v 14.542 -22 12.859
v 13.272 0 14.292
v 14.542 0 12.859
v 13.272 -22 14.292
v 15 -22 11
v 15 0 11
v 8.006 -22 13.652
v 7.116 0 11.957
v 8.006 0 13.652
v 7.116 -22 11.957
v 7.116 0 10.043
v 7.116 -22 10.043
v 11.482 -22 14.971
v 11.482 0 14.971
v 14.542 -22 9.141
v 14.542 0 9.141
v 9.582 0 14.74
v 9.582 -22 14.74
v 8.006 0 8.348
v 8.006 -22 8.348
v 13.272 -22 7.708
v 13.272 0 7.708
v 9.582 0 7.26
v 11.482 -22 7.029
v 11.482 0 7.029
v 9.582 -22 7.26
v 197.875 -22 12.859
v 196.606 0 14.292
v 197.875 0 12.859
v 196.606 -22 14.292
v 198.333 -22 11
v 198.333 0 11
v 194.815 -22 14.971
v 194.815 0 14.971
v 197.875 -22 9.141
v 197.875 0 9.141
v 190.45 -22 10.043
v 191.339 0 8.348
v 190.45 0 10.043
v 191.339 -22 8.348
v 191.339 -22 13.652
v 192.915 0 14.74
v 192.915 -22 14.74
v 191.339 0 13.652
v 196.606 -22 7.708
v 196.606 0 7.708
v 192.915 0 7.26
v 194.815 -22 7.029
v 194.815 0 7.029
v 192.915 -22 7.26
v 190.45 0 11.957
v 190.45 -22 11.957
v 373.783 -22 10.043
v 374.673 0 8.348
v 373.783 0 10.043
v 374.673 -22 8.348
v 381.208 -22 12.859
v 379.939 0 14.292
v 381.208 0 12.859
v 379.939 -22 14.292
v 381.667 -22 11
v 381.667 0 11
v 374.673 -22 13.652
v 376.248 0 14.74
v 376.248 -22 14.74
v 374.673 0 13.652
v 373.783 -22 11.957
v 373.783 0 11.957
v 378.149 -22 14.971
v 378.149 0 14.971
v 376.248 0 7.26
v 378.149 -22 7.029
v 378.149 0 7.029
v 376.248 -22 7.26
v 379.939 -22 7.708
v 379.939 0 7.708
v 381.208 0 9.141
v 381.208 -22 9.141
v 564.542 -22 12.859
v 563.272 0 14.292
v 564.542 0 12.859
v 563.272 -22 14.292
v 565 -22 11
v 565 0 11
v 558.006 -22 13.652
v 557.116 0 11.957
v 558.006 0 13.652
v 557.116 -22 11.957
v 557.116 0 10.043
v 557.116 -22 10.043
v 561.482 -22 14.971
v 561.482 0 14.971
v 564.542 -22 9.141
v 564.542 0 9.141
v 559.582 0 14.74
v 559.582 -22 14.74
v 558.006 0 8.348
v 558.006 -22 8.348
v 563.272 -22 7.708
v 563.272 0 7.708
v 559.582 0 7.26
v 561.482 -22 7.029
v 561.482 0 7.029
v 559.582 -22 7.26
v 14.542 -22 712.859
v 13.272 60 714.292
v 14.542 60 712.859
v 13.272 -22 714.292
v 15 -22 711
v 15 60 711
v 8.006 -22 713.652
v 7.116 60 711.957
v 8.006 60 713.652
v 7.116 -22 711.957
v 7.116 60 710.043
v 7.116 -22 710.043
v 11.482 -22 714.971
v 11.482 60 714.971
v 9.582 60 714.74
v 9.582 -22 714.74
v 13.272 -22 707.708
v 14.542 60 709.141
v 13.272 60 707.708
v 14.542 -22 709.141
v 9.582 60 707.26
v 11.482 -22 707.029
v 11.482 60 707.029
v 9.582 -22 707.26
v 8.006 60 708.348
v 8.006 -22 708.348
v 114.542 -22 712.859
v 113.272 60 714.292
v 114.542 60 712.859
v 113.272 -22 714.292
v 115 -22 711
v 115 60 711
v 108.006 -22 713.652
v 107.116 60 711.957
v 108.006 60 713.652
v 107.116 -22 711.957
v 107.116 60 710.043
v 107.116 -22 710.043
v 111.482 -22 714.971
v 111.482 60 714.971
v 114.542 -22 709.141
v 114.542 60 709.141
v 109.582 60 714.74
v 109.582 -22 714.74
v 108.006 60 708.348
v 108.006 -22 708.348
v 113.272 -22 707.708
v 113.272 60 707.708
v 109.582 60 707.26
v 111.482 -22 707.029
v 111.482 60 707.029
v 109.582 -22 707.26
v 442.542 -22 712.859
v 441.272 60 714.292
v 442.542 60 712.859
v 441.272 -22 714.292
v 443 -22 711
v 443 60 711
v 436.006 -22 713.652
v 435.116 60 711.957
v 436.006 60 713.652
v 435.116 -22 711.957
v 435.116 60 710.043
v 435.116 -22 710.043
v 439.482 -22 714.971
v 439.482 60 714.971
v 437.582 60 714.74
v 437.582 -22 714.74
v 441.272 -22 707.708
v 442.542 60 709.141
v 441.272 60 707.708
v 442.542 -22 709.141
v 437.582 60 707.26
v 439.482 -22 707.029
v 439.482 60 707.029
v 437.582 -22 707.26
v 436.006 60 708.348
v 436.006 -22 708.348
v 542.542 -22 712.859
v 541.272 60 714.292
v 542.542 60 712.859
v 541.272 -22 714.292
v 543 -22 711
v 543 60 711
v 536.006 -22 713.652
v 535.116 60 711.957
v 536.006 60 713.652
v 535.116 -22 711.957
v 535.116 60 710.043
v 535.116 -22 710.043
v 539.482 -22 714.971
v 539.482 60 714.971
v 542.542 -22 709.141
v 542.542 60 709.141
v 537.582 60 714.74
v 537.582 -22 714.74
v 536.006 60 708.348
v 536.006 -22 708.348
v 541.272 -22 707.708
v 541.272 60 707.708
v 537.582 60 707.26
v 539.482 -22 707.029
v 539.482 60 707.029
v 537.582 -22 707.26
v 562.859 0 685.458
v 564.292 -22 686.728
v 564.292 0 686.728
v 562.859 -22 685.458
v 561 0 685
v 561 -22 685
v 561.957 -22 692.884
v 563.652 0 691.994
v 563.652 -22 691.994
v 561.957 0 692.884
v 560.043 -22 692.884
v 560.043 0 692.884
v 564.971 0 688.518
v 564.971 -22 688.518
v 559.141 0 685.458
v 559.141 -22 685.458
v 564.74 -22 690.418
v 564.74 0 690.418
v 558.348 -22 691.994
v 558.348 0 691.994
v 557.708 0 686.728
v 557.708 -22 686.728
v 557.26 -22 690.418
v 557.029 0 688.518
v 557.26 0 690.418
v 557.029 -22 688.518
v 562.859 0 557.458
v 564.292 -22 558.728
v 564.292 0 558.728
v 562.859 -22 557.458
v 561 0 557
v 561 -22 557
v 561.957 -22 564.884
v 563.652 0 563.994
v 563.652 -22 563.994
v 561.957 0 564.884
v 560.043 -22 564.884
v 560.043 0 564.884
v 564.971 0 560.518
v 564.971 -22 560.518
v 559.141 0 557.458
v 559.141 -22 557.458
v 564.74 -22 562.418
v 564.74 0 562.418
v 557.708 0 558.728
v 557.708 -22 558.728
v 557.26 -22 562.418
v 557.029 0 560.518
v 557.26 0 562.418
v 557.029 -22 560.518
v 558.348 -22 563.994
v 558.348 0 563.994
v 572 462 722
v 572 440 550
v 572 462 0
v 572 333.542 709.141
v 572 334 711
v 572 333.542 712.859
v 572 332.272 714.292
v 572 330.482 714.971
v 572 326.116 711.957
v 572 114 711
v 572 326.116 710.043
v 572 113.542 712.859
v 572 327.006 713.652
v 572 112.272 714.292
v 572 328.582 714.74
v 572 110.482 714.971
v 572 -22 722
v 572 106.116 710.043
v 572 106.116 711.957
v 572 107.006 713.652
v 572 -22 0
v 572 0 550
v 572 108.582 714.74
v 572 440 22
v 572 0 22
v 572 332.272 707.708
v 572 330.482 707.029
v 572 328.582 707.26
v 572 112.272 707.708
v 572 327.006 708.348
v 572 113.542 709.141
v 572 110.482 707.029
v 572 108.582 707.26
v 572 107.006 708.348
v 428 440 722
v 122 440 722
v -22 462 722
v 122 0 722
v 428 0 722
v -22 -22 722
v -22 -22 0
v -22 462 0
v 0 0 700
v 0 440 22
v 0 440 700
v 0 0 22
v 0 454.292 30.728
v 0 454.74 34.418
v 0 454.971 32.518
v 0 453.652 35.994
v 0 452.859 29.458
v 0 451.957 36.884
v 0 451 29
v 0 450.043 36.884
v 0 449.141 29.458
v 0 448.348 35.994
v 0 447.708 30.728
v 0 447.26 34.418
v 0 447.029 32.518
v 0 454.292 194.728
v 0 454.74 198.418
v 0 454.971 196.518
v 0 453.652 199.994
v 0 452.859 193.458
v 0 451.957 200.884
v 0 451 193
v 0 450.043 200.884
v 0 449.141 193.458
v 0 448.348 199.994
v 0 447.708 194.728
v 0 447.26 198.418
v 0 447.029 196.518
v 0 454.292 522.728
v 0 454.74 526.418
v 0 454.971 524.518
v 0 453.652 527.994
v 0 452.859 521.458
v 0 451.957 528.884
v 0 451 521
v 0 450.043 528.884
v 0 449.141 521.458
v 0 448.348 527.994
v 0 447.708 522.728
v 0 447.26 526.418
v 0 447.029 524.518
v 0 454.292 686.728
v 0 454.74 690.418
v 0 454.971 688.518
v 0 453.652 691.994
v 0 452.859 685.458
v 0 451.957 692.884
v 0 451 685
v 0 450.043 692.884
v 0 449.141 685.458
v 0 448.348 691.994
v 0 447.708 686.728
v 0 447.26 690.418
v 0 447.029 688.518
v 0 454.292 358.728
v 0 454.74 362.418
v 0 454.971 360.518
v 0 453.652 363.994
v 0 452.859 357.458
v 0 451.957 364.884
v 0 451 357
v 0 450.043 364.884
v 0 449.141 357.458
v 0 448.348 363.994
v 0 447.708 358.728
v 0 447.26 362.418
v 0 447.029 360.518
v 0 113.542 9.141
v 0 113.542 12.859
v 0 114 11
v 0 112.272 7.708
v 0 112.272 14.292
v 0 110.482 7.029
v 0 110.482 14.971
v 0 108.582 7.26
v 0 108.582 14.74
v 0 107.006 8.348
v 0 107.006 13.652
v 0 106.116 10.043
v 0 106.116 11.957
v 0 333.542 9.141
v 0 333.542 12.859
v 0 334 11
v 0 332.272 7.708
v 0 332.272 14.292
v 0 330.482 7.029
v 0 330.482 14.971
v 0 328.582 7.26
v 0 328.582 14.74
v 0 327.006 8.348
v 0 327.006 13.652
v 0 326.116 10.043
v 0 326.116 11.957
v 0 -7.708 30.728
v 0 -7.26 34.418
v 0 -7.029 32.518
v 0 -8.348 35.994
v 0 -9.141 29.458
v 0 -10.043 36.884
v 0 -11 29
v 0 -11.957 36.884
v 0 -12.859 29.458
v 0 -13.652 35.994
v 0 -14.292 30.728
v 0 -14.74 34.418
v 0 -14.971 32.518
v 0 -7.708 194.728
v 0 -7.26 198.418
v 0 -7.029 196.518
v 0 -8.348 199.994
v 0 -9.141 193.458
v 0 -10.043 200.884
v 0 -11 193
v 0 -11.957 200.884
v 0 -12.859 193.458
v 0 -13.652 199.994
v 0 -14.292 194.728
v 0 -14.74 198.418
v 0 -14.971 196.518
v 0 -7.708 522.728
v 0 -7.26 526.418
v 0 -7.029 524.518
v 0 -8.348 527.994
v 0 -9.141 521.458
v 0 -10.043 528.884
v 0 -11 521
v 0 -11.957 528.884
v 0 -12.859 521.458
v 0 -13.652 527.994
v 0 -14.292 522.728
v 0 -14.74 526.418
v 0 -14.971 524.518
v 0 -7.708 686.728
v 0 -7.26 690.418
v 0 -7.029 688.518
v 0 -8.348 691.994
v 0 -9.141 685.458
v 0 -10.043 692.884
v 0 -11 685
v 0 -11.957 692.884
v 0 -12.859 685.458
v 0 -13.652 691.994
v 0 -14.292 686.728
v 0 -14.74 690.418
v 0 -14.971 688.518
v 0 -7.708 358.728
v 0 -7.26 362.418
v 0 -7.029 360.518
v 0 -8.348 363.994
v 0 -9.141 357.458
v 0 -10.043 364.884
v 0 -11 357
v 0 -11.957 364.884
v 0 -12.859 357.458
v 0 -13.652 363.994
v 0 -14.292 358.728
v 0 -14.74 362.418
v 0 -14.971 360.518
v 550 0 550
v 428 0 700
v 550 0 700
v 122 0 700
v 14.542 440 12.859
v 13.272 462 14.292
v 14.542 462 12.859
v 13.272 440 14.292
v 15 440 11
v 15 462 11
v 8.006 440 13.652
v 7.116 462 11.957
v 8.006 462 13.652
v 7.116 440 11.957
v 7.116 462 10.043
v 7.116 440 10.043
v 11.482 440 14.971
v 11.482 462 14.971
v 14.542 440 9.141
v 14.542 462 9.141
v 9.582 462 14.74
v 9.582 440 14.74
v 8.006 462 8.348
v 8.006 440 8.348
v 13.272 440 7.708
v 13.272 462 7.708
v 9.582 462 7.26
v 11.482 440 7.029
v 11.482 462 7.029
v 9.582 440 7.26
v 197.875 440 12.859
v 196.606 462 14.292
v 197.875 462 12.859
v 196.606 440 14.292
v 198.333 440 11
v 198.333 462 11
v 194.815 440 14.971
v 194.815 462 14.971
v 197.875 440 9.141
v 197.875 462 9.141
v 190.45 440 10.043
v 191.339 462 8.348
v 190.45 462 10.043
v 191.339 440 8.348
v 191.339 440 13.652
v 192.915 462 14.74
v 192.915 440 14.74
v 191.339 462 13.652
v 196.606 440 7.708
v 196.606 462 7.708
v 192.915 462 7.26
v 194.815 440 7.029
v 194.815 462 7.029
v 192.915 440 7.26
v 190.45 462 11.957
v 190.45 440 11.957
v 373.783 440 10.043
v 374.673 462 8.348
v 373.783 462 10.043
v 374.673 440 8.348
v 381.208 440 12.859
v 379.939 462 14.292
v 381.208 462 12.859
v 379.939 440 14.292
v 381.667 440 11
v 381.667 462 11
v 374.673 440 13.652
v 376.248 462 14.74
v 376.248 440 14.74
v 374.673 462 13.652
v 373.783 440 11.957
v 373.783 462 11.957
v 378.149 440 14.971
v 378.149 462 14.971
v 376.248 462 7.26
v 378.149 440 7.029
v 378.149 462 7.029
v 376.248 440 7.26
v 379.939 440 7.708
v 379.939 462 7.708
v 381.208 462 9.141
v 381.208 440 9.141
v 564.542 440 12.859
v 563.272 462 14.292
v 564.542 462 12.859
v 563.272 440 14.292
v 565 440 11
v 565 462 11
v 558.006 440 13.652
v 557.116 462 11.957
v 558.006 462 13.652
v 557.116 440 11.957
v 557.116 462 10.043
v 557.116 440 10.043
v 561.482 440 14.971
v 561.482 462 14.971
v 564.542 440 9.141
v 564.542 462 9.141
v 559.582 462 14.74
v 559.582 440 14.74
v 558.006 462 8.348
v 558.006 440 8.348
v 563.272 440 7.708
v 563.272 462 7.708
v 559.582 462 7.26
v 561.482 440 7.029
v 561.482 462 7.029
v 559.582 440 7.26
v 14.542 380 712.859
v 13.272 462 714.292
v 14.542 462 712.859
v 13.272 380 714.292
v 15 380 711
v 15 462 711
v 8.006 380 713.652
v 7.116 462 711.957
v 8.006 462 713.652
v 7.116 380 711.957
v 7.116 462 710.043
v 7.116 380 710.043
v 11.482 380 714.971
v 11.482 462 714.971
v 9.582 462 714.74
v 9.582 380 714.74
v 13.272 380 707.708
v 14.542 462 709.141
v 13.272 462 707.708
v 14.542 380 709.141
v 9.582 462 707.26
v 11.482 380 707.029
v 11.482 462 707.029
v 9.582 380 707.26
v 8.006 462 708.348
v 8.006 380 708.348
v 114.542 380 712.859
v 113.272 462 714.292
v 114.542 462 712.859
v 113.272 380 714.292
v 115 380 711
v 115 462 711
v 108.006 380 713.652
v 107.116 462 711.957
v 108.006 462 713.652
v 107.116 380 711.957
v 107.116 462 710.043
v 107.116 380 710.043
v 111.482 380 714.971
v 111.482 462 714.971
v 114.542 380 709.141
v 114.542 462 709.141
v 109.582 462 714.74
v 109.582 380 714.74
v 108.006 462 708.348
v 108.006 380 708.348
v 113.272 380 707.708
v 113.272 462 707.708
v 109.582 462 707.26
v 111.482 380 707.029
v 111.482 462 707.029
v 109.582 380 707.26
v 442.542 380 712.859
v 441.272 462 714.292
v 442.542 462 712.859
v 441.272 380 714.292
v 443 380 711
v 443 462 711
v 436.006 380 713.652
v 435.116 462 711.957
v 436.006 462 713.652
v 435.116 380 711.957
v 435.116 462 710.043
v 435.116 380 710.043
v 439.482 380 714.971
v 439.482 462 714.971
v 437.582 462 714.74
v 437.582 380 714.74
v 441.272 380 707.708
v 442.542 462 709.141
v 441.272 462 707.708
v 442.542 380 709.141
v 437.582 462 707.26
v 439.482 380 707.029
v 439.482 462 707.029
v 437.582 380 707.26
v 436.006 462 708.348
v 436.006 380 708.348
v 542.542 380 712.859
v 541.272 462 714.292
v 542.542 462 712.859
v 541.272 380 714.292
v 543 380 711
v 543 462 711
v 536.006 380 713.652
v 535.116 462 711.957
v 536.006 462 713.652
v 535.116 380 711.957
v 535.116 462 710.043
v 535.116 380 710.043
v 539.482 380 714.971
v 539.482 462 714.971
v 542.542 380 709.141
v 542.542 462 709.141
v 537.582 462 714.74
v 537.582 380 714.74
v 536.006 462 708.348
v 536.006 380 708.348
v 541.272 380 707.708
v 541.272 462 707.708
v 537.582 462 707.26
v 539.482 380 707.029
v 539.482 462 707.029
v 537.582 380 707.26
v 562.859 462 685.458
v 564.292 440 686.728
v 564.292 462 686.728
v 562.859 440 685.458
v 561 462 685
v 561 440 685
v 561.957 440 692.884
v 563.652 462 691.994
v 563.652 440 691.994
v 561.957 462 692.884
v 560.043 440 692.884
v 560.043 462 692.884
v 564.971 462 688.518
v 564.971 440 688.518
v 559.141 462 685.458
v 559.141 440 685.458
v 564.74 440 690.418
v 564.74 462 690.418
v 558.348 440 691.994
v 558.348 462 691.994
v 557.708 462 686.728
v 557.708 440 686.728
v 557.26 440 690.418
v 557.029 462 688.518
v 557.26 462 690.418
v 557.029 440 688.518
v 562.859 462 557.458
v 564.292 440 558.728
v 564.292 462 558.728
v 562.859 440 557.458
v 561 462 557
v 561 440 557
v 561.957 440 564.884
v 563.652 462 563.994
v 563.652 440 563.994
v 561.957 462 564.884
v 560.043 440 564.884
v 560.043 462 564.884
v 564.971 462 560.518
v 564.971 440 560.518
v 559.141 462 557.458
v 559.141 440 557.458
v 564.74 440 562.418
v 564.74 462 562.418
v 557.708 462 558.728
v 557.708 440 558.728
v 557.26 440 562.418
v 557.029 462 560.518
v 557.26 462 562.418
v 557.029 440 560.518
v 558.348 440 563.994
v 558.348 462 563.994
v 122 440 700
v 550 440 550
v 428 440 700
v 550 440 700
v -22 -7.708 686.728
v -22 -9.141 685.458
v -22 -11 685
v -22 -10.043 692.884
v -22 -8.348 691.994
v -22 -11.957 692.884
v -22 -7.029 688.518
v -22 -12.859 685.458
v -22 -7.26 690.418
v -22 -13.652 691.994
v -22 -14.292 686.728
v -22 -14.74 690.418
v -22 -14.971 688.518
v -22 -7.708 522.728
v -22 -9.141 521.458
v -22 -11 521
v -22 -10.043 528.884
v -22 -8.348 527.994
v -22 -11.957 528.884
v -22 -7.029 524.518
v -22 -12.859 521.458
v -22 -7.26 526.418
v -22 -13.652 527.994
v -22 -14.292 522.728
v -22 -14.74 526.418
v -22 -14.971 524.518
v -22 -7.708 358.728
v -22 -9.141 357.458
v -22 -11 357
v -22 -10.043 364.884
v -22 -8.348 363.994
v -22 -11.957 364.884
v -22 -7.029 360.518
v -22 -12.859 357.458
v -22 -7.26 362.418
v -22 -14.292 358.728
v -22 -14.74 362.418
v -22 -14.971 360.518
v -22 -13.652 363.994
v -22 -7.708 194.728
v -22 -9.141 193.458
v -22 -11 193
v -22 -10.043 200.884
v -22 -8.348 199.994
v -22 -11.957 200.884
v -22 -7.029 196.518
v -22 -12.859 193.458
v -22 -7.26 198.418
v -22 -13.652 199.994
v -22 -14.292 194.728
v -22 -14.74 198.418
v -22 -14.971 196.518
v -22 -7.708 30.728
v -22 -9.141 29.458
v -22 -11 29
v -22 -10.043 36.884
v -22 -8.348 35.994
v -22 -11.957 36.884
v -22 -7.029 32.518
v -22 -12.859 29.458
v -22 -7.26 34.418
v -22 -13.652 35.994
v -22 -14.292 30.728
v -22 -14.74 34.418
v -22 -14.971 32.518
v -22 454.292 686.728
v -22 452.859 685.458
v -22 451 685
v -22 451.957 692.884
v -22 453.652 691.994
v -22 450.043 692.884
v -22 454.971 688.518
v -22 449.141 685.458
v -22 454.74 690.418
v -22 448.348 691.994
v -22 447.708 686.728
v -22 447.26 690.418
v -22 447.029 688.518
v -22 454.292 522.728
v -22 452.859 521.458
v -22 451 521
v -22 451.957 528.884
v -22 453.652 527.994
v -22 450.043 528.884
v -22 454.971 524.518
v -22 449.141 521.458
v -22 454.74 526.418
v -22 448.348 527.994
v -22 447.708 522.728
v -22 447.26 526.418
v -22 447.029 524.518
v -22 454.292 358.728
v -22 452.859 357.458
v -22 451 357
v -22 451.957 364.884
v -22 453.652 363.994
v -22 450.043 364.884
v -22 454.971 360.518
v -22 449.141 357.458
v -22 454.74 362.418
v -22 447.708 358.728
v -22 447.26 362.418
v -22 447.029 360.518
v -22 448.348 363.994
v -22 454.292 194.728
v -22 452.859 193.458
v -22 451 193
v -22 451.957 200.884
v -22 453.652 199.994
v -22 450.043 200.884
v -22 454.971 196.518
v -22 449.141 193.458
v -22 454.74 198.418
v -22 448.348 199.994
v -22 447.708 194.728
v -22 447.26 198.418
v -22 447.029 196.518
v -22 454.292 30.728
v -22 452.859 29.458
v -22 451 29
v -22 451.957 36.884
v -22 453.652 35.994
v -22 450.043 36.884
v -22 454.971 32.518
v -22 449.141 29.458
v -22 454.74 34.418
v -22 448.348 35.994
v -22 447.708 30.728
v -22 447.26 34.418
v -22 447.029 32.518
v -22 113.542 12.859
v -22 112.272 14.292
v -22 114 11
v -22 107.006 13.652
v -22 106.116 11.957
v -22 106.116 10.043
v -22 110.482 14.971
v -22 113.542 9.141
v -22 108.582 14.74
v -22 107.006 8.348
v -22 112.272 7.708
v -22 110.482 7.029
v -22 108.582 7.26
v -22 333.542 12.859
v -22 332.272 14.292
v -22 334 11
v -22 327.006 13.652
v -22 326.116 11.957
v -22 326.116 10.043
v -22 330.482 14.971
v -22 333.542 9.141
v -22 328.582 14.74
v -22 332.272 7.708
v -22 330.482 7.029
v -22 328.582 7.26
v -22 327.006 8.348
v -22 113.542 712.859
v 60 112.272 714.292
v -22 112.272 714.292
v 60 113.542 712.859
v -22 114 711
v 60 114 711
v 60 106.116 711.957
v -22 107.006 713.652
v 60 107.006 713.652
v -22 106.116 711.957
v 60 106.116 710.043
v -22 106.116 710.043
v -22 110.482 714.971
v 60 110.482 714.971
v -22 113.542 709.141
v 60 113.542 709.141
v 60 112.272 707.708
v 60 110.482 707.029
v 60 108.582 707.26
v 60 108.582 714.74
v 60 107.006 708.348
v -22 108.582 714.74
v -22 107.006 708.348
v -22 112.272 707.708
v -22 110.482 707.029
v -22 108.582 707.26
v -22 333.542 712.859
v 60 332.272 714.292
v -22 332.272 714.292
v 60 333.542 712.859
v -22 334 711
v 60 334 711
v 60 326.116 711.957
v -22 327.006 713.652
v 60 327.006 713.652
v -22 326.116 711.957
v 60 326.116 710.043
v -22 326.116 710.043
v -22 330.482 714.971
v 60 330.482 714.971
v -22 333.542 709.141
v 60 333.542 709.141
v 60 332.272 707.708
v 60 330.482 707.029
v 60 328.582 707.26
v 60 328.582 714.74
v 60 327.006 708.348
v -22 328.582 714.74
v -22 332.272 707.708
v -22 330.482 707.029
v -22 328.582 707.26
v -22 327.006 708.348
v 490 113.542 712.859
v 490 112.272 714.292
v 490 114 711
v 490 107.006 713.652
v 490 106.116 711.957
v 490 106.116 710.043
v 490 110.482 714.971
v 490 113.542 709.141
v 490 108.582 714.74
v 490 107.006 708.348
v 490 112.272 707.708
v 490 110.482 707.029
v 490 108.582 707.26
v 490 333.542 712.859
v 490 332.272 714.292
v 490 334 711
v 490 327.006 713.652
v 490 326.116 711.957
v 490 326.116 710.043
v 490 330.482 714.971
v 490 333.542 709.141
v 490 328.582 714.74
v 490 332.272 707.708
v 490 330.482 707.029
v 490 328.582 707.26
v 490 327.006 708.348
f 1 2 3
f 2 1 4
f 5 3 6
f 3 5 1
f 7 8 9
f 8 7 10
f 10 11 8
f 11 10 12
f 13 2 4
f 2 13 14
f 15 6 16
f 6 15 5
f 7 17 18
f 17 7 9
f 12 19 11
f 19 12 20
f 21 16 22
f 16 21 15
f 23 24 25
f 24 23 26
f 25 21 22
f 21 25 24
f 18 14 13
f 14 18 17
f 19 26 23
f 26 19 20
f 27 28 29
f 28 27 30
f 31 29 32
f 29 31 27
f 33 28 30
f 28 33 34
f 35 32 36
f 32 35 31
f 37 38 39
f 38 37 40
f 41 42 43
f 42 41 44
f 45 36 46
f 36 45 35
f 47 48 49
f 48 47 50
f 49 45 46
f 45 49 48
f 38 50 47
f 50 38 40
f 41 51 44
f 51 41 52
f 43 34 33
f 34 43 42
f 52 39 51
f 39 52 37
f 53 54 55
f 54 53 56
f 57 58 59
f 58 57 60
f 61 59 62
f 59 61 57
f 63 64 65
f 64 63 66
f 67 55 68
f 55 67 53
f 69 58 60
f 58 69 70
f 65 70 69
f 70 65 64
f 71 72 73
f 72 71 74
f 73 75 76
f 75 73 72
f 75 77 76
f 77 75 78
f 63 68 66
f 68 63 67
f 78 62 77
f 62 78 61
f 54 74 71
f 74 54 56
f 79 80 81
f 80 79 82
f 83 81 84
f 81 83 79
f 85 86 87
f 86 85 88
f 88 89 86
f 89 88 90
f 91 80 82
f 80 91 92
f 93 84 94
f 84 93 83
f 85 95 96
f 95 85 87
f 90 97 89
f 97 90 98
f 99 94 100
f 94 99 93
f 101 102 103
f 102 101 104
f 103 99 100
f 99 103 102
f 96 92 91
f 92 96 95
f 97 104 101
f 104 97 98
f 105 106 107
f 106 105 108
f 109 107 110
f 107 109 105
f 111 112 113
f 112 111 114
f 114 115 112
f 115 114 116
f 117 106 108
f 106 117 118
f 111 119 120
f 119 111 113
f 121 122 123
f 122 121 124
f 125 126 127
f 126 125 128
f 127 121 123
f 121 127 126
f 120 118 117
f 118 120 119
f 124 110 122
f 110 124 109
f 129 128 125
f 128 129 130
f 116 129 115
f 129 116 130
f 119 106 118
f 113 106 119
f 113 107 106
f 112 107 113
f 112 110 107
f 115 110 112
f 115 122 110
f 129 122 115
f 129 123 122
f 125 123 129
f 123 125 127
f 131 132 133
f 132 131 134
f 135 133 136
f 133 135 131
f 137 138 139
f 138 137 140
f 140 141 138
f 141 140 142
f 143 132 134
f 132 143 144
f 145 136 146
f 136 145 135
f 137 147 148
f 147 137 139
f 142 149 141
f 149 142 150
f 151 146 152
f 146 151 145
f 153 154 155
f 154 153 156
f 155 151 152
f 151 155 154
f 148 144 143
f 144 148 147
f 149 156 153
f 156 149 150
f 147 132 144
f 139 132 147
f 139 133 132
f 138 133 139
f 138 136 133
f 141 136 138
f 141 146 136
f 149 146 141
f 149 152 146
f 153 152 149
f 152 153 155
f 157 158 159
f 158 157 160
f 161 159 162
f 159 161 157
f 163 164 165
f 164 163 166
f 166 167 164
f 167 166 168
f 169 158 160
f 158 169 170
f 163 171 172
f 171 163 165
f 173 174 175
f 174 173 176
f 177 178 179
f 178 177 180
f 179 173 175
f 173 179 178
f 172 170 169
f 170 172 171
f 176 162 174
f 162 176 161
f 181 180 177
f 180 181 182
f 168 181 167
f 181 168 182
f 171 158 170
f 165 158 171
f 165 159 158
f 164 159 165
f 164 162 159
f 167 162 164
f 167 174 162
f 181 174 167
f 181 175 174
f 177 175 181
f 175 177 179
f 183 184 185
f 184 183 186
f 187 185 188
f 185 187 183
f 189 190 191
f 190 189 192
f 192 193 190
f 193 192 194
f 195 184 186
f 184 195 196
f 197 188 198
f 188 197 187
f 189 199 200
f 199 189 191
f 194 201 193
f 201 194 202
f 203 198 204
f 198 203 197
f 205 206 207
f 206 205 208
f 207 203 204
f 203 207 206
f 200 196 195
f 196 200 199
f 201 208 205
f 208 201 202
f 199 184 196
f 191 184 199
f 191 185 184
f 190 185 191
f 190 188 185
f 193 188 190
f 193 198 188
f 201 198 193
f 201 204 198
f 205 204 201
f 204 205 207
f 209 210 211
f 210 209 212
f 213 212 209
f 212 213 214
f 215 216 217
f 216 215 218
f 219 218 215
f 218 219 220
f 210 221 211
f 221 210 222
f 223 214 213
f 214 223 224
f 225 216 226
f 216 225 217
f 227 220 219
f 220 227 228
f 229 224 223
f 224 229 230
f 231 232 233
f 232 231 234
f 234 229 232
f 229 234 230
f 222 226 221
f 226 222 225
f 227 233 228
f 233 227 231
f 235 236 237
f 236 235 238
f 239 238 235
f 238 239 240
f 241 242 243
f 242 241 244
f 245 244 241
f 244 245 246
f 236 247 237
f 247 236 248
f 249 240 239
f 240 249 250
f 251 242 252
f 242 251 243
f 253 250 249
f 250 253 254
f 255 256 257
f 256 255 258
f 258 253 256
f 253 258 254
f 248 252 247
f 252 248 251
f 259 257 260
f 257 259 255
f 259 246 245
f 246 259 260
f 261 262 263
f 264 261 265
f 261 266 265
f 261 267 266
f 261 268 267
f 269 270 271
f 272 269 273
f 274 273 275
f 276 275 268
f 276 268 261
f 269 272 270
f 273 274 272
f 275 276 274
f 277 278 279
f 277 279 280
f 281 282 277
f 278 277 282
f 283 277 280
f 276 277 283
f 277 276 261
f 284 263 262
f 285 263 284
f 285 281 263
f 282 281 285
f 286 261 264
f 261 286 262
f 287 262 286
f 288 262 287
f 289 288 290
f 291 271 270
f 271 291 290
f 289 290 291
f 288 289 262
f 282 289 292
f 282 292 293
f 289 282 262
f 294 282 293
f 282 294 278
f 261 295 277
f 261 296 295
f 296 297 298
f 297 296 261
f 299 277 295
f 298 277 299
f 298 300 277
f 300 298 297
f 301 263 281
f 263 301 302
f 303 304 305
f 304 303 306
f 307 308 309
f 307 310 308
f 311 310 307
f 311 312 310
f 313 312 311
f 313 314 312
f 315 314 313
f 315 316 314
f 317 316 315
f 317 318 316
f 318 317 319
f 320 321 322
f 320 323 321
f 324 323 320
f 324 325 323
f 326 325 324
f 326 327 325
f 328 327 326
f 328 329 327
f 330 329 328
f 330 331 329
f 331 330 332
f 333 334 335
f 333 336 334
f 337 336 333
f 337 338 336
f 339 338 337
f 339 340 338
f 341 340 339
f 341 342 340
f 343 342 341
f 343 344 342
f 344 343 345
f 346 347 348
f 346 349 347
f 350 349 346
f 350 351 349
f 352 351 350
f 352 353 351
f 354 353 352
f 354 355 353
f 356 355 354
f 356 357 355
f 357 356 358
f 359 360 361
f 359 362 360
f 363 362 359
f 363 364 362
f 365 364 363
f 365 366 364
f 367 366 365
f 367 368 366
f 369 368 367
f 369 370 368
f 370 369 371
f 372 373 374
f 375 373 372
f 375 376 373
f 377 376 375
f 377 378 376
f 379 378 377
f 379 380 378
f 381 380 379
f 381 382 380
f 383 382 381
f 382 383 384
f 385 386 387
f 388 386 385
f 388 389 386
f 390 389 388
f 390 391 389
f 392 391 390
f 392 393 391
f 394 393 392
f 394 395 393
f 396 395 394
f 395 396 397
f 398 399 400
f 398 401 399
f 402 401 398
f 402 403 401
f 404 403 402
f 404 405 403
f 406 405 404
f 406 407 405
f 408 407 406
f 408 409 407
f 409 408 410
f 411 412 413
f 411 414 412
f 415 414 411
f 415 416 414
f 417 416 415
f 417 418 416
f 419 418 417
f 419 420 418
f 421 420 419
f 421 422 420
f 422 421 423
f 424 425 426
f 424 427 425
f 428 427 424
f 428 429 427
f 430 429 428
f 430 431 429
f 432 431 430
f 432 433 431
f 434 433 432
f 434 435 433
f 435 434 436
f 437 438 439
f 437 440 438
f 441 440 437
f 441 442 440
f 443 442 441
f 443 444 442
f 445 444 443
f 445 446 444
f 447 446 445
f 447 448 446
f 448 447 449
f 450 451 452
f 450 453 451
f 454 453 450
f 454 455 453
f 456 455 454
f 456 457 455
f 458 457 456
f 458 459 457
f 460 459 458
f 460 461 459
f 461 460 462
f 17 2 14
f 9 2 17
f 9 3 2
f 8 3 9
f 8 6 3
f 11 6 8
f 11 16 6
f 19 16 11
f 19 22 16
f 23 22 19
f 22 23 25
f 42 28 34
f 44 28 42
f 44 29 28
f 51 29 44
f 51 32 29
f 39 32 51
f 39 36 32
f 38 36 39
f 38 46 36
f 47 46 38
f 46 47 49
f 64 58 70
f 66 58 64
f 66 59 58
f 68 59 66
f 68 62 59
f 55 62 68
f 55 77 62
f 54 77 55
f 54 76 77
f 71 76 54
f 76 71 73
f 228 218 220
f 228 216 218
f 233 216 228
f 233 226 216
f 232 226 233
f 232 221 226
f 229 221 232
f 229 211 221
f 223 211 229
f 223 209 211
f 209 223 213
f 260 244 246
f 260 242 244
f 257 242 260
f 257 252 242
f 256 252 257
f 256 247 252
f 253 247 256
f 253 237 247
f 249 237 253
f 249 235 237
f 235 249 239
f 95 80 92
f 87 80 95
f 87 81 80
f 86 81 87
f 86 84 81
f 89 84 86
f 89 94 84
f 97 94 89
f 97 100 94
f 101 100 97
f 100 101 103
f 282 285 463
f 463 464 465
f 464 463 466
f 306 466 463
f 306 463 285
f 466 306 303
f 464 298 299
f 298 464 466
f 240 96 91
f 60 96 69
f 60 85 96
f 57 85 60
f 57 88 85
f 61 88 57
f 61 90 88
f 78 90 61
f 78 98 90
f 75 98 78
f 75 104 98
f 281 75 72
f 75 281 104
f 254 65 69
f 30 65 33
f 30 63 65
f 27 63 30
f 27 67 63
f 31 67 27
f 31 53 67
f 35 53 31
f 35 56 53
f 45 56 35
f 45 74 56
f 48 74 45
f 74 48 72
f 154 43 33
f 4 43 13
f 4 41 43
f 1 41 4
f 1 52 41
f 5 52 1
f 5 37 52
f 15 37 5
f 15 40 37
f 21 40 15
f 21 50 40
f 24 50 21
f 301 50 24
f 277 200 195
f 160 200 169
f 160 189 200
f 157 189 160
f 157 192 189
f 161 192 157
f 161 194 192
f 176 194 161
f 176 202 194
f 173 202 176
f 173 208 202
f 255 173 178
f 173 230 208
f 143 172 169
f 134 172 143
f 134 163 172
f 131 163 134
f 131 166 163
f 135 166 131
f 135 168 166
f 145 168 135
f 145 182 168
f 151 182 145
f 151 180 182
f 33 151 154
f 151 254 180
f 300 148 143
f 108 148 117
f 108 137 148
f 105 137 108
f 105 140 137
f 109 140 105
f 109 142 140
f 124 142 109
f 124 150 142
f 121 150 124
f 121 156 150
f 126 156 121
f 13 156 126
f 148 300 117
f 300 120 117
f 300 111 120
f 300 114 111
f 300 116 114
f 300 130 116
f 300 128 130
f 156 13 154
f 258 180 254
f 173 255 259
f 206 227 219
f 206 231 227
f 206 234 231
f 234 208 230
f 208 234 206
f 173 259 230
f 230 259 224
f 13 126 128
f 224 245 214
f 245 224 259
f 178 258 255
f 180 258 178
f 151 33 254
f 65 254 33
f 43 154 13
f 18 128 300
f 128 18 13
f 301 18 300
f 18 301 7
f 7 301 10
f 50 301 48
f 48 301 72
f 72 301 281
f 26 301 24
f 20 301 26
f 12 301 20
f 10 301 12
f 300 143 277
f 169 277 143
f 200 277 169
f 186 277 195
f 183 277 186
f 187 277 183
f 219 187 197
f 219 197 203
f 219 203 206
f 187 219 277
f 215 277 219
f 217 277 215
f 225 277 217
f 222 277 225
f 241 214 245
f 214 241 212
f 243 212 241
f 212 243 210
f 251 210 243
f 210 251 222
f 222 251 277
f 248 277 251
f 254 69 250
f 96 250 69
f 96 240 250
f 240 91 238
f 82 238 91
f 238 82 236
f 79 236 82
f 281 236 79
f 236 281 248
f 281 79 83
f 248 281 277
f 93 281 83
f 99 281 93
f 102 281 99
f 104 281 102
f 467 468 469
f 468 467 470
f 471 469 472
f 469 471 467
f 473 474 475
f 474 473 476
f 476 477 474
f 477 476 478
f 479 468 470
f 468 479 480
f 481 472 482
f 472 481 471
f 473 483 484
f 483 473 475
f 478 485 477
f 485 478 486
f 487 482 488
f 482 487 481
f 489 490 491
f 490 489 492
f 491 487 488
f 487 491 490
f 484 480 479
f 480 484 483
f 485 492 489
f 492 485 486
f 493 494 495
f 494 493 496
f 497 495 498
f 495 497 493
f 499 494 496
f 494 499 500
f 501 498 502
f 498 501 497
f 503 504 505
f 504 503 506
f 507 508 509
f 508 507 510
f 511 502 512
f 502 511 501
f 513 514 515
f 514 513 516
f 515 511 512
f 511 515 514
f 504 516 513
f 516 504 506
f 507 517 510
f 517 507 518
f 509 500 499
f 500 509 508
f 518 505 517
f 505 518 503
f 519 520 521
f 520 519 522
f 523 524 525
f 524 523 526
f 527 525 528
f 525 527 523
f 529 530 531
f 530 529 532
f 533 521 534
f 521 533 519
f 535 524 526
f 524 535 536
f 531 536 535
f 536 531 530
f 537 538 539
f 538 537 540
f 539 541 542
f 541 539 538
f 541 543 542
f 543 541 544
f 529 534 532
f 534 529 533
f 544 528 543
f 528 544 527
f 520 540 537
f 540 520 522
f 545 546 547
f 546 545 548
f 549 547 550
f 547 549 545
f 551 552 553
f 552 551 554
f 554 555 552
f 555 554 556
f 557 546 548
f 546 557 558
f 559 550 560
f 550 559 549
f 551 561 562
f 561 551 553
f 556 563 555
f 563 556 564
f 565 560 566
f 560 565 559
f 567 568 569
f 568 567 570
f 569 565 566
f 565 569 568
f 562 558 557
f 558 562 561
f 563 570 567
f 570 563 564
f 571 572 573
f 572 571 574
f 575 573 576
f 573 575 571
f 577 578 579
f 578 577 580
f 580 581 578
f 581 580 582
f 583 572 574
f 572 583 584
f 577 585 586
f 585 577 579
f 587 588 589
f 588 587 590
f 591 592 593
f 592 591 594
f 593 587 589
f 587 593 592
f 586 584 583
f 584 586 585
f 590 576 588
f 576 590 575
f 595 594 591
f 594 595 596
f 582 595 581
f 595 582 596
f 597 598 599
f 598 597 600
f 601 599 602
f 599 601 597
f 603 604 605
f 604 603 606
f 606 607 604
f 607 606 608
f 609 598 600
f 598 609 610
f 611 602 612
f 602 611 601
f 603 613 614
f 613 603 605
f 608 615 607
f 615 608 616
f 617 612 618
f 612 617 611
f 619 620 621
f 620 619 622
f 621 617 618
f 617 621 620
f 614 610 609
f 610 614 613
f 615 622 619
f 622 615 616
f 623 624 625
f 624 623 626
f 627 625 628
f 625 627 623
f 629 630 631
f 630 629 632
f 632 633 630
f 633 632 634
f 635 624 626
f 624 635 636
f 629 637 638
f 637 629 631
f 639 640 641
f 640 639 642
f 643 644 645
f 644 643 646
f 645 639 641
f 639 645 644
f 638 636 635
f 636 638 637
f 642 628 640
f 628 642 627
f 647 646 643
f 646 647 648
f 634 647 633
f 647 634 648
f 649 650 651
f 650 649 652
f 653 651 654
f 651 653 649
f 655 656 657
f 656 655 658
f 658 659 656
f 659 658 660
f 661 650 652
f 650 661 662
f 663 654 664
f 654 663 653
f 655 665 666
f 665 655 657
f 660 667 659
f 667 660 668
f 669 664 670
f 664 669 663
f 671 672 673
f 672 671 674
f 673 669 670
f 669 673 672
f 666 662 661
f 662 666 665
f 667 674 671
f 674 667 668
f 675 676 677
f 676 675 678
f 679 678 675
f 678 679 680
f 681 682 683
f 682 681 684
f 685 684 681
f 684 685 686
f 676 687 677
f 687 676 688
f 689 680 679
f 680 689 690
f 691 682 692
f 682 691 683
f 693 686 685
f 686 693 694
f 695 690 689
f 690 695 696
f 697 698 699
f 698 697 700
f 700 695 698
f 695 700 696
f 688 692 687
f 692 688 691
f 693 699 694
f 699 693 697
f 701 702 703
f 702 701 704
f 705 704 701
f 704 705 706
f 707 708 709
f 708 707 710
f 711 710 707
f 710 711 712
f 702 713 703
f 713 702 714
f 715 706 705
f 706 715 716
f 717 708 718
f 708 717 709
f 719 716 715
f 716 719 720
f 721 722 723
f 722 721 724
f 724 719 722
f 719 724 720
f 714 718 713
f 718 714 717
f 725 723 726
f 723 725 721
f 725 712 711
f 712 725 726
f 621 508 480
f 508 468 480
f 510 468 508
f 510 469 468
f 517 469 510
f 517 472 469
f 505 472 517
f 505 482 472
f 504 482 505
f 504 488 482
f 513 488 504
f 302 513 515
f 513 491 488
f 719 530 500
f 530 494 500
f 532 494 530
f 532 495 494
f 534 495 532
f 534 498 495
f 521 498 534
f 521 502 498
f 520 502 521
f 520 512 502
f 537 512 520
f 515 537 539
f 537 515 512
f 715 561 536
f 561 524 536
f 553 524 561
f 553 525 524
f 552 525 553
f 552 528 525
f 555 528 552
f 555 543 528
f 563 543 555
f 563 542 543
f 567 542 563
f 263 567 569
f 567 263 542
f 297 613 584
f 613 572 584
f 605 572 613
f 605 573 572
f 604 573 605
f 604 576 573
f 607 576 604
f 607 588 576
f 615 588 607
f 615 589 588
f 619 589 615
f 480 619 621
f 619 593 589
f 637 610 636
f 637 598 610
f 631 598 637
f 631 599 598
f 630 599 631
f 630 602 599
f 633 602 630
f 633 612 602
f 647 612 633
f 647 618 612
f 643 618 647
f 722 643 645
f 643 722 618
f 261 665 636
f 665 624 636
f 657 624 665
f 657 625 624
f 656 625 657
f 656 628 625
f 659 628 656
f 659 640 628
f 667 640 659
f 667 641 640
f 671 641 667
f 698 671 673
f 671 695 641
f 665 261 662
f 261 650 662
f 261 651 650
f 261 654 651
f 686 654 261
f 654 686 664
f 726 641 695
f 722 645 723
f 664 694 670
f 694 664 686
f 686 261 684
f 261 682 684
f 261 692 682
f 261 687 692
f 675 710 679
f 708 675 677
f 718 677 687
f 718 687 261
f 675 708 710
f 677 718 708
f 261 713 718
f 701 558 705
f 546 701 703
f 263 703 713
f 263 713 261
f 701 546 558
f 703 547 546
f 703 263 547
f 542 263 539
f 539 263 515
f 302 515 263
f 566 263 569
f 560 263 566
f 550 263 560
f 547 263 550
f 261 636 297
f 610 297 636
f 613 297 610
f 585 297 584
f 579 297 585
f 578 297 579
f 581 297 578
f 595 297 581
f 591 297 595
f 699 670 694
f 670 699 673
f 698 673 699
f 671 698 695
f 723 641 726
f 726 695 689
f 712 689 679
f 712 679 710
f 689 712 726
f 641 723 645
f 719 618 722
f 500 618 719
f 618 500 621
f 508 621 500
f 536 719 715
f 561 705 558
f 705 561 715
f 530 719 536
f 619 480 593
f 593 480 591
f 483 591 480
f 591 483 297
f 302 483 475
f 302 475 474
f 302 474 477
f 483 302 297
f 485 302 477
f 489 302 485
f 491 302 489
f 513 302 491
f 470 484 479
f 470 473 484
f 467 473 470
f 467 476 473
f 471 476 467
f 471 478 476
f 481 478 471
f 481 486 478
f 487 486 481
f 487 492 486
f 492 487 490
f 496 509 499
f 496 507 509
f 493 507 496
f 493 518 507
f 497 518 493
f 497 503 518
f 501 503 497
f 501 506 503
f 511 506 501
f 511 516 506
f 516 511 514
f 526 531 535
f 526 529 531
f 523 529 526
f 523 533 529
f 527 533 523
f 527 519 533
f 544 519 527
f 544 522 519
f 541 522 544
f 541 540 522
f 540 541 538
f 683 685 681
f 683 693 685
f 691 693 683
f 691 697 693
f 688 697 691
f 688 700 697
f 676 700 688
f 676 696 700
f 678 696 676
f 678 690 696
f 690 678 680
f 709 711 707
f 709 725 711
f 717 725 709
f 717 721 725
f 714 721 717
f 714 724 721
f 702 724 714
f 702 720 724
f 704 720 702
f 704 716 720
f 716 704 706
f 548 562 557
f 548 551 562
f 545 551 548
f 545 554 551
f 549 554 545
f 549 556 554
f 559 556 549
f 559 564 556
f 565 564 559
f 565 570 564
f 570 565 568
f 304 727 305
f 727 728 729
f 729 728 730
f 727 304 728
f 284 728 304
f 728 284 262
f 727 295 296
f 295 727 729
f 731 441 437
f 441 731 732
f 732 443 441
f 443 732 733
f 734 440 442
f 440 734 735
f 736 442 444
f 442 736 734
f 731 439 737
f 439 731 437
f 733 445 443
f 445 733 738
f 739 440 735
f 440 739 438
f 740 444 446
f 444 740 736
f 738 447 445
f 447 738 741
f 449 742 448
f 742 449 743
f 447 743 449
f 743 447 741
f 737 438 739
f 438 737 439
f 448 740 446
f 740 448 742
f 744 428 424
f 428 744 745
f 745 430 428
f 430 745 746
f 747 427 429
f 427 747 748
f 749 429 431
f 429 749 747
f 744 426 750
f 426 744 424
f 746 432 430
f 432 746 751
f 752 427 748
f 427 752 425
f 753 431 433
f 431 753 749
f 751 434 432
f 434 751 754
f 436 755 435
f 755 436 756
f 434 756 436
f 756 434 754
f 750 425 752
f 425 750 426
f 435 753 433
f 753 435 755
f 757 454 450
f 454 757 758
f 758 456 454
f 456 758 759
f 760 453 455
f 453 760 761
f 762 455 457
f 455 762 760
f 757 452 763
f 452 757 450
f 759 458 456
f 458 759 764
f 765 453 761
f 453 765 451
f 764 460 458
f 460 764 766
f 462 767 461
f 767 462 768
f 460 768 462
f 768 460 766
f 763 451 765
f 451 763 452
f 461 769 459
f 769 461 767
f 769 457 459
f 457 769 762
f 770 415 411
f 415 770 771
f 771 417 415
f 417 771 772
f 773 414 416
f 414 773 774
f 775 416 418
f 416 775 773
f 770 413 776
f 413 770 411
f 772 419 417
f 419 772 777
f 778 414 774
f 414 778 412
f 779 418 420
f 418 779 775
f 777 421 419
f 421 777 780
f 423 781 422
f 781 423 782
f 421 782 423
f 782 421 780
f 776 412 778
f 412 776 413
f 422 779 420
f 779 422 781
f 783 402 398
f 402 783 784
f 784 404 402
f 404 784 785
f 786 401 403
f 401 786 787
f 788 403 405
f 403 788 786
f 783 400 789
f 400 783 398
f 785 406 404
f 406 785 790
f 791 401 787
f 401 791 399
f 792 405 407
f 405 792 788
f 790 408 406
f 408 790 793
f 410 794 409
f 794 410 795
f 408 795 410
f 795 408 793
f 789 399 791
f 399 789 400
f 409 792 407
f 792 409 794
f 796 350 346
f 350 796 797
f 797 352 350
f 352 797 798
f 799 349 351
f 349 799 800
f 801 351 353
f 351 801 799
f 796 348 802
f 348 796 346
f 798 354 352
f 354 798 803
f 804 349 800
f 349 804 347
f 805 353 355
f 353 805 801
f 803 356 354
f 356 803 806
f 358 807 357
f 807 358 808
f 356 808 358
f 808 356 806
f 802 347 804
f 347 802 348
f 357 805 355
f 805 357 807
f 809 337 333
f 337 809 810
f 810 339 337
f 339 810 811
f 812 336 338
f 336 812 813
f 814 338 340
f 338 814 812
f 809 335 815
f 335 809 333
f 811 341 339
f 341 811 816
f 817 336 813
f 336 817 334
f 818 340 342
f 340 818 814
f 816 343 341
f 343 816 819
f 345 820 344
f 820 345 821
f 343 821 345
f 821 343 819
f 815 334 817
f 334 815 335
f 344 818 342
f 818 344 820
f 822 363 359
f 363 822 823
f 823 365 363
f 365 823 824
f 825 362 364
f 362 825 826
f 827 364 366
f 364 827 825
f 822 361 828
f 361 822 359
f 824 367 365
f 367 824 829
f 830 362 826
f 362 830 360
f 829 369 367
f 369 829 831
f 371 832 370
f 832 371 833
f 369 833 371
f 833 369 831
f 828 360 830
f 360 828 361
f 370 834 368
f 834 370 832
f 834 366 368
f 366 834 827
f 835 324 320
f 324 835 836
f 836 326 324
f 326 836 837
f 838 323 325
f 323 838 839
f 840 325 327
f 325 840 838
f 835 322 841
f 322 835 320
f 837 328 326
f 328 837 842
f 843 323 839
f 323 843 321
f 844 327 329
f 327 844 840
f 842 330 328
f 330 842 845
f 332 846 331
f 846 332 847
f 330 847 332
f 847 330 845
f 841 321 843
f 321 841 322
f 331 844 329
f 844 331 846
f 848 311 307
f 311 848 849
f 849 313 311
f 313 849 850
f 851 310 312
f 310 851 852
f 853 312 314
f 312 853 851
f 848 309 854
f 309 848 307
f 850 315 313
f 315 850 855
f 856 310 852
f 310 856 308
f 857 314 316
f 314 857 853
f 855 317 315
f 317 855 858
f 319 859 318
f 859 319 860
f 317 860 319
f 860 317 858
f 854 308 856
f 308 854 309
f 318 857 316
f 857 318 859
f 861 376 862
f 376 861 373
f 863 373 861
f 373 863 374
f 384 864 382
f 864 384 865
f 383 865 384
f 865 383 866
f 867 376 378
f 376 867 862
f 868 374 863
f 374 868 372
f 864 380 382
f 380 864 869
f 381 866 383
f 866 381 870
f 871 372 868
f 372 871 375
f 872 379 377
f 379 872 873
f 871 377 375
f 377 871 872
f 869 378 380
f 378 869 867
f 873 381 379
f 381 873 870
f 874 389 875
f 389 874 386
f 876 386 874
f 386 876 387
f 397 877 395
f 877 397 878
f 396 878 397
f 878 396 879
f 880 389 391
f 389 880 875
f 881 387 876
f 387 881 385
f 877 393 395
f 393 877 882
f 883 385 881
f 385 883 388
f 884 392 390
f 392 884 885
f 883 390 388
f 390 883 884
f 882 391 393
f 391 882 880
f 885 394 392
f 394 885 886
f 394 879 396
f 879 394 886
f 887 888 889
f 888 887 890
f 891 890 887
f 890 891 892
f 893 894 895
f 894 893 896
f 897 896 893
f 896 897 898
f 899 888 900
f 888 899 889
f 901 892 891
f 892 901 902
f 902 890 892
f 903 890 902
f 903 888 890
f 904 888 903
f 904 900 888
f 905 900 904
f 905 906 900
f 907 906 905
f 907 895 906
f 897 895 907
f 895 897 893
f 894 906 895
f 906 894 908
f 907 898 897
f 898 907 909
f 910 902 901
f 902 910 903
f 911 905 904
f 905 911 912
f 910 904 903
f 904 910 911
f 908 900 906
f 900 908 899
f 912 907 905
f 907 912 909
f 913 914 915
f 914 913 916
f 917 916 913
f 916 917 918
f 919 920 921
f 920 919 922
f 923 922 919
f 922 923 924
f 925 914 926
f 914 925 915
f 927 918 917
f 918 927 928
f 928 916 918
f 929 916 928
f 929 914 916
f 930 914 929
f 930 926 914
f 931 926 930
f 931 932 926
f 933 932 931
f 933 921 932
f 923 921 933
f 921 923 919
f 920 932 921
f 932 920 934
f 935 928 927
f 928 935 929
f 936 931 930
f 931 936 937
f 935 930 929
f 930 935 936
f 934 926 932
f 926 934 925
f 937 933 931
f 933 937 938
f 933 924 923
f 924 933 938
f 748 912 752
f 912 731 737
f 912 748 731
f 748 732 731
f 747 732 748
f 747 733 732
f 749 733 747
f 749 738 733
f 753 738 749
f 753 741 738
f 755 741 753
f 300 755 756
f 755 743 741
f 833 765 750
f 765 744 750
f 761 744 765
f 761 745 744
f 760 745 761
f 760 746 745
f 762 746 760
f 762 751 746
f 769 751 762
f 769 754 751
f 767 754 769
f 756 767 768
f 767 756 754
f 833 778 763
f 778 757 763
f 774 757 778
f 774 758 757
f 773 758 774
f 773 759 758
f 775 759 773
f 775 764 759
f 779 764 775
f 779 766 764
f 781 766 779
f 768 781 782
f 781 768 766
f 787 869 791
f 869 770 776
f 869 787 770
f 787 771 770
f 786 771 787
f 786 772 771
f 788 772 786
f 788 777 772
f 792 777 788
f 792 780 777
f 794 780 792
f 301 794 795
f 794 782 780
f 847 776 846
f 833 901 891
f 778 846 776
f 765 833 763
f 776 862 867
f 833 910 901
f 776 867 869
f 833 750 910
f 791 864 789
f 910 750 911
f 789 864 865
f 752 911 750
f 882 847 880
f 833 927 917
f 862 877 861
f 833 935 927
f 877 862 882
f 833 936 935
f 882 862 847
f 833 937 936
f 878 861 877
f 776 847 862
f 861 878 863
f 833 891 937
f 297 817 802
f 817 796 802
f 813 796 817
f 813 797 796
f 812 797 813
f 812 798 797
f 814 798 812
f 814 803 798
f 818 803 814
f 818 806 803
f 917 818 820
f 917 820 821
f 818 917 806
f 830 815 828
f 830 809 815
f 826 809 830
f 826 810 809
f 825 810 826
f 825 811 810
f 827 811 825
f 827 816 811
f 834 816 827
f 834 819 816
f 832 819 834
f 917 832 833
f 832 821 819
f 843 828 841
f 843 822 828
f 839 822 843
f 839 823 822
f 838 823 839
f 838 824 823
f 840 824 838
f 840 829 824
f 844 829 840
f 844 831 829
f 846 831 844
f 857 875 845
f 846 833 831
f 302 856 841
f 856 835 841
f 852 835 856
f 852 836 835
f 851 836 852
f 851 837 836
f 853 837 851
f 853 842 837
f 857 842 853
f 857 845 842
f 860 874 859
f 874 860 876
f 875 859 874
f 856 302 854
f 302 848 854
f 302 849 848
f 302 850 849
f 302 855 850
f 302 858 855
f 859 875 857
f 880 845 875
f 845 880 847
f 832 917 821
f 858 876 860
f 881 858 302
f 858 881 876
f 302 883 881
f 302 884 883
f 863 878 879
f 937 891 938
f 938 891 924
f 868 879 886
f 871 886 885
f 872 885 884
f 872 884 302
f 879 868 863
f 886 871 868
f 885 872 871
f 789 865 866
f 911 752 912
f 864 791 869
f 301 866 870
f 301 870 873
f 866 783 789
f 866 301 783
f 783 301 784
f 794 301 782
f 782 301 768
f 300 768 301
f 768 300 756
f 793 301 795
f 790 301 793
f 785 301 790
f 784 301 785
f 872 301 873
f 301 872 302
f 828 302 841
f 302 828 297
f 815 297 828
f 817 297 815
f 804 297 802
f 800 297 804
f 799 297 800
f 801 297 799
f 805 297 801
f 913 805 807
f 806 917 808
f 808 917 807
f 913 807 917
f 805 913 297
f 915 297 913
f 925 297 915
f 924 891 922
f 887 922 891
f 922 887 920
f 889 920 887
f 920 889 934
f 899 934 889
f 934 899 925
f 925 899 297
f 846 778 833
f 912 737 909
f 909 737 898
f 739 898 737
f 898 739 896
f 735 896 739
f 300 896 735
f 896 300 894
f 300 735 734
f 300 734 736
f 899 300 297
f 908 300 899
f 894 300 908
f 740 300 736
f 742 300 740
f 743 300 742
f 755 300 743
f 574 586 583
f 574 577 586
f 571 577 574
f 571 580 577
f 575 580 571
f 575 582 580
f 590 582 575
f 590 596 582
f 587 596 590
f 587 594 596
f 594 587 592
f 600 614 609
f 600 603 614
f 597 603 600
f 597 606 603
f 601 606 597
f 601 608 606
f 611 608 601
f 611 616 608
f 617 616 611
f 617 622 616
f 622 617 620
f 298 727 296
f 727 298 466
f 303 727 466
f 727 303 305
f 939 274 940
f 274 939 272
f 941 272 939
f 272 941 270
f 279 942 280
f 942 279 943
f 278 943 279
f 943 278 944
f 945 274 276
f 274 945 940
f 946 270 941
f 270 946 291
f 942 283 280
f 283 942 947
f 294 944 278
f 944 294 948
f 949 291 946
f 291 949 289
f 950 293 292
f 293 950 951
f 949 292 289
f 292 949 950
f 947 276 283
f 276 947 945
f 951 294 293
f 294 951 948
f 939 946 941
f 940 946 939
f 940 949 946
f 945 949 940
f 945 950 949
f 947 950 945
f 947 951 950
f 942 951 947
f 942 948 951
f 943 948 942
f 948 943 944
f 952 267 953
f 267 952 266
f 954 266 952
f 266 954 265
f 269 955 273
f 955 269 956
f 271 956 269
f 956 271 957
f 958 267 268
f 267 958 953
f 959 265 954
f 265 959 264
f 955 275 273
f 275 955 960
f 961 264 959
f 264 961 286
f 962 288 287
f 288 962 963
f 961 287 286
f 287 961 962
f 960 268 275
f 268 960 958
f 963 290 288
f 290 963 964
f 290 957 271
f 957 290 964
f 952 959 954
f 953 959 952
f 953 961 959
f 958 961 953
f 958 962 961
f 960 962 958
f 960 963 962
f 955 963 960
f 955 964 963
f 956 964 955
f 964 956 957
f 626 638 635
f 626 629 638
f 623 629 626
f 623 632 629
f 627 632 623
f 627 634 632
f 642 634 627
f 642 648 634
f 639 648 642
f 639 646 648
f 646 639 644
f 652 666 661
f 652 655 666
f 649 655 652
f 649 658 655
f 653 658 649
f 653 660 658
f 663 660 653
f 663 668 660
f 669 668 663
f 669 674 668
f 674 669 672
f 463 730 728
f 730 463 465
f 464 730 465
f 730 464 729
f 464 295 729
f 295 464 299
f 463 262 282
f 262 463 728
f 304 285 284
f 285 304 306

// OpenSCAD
//
// Ящик для Вулкана 1 из ЛДСП
// Автор: MadeIn USSR 2018 (С)
//

wt=22;  // толщина плиты (12, 16, 18, 22, 25)
rw=550; // ширина внутр. периметра 
rd=440; // длина внутр. периметра 
rz=700; // высота внутр. периметра 
ed=100; // длина внутр. балок 
fz=150; // высота передней панели
bd=8;   // диаметр под болты
dd=60;  // глубина под болты

module holeCycle(dim = rw, sx = wt/2, kolvo = 4) {
    st=(dim)/(kolvo - 1);
    for(i = [0:kolvo-1]) {
        translate([sx + i * st, dd, sx]) 
            rotate([90, 0, 0]) cylinder(d=bd, h=dd*2);
    }
}

module bottomPlate() {
    cube([wt + rw, rd, wt]);
}
module leftPlate() {
    difference() {
        translate([0, -wt, 0]) cube([wt + rw, wt, wt + rz]);
        color("red") {
            holeCycle();
            translate([0, 0, rz]) holeCycle(dim=ed, kolvo=2);
            translate([rw-wt-ed, 0, rz]) holeCycle(dim=ed, kolvo=2);
            translate([rw, 0, rz]) rotate([0, 90, 0]) holeCycle(dim=fz-wt, kolvo=2);
        }
    }
}
module rightPlate() {
    translate([0, rd + wt, 0]) leftPlate();
}
module backPlate() {
    difference() {
        translate([-wt, -wt, 0]) cube([wt, wt * 2 + rd, wt + rz]);
        color("red") {
            translate([0, -wt, rz]) rotate([0, 90, 90]) holeCycle(dim=rz-wt*2, kolvo=5);
            translate([0, rd, rz]) rotate([0, 90, 90]) holeCycle(dim=rz-wt*2, kolvo=5);
            translate([0, rd/4-wt/2, 0]) rotate([0, 0, 90]) holeCycle(dim=rd/2, kolvo=2);
            translate([0, rd/4-wt/2, rz]) rotate([0, 0, 90]) holeCycle(dim=rd/2, kolvo=2);
        }
    }
}
module backBridge() {
    difference() {
        translate([0, 0, rz]) cube([wt + ed, rd, wt]);
        color("yellow") {
            translate([0, rd/4-wt/2, rz]) rotate([0, 0, 90]) holeCycle(dim=rd/2, kolvo=2);
            translate([0, 0, rz]) holeCycle(dim=ed, kolvo=2);
            translate([0, rd, rz]) holeCycle(dim=ed, kolvo=2);
        }
    }
}
module frontBridge() {
    difference() {
        translate([rw-wt-ed, 0, rz]) cube([wt + ed, rd, wt]);
        color("yellow") {
            translate([rw, rd/4-wt/2, rz]) rotate([0, 0, 90]) holeCycle(dim=rd/2, kolvo=2);
            translate([rw-wt-ed, 0, rz]) holeCycle(dim=ed, kolvo=2);
            translate([rw-wt-ed, rd, rz]) holeCycle(dim=ed, kolvo=2);
        }
    }
}
module frontPanel() {
    difference() {
        translate([rw, 0, rz-fz]) cube([wt, rd, wt + fz]);
        color("red") translate([rw, rd/4-wt/2, rz]) rotate([0, 0, 90]) holeCycle(dim=rd/2, kolvo=2);
    }
}

module draft1() {
    bottomPlate();
    leftPlate();
    rightPlate();
    backPlate();
    backBridge();
    frontBridge();
    frontPanel();
}

draft1();
